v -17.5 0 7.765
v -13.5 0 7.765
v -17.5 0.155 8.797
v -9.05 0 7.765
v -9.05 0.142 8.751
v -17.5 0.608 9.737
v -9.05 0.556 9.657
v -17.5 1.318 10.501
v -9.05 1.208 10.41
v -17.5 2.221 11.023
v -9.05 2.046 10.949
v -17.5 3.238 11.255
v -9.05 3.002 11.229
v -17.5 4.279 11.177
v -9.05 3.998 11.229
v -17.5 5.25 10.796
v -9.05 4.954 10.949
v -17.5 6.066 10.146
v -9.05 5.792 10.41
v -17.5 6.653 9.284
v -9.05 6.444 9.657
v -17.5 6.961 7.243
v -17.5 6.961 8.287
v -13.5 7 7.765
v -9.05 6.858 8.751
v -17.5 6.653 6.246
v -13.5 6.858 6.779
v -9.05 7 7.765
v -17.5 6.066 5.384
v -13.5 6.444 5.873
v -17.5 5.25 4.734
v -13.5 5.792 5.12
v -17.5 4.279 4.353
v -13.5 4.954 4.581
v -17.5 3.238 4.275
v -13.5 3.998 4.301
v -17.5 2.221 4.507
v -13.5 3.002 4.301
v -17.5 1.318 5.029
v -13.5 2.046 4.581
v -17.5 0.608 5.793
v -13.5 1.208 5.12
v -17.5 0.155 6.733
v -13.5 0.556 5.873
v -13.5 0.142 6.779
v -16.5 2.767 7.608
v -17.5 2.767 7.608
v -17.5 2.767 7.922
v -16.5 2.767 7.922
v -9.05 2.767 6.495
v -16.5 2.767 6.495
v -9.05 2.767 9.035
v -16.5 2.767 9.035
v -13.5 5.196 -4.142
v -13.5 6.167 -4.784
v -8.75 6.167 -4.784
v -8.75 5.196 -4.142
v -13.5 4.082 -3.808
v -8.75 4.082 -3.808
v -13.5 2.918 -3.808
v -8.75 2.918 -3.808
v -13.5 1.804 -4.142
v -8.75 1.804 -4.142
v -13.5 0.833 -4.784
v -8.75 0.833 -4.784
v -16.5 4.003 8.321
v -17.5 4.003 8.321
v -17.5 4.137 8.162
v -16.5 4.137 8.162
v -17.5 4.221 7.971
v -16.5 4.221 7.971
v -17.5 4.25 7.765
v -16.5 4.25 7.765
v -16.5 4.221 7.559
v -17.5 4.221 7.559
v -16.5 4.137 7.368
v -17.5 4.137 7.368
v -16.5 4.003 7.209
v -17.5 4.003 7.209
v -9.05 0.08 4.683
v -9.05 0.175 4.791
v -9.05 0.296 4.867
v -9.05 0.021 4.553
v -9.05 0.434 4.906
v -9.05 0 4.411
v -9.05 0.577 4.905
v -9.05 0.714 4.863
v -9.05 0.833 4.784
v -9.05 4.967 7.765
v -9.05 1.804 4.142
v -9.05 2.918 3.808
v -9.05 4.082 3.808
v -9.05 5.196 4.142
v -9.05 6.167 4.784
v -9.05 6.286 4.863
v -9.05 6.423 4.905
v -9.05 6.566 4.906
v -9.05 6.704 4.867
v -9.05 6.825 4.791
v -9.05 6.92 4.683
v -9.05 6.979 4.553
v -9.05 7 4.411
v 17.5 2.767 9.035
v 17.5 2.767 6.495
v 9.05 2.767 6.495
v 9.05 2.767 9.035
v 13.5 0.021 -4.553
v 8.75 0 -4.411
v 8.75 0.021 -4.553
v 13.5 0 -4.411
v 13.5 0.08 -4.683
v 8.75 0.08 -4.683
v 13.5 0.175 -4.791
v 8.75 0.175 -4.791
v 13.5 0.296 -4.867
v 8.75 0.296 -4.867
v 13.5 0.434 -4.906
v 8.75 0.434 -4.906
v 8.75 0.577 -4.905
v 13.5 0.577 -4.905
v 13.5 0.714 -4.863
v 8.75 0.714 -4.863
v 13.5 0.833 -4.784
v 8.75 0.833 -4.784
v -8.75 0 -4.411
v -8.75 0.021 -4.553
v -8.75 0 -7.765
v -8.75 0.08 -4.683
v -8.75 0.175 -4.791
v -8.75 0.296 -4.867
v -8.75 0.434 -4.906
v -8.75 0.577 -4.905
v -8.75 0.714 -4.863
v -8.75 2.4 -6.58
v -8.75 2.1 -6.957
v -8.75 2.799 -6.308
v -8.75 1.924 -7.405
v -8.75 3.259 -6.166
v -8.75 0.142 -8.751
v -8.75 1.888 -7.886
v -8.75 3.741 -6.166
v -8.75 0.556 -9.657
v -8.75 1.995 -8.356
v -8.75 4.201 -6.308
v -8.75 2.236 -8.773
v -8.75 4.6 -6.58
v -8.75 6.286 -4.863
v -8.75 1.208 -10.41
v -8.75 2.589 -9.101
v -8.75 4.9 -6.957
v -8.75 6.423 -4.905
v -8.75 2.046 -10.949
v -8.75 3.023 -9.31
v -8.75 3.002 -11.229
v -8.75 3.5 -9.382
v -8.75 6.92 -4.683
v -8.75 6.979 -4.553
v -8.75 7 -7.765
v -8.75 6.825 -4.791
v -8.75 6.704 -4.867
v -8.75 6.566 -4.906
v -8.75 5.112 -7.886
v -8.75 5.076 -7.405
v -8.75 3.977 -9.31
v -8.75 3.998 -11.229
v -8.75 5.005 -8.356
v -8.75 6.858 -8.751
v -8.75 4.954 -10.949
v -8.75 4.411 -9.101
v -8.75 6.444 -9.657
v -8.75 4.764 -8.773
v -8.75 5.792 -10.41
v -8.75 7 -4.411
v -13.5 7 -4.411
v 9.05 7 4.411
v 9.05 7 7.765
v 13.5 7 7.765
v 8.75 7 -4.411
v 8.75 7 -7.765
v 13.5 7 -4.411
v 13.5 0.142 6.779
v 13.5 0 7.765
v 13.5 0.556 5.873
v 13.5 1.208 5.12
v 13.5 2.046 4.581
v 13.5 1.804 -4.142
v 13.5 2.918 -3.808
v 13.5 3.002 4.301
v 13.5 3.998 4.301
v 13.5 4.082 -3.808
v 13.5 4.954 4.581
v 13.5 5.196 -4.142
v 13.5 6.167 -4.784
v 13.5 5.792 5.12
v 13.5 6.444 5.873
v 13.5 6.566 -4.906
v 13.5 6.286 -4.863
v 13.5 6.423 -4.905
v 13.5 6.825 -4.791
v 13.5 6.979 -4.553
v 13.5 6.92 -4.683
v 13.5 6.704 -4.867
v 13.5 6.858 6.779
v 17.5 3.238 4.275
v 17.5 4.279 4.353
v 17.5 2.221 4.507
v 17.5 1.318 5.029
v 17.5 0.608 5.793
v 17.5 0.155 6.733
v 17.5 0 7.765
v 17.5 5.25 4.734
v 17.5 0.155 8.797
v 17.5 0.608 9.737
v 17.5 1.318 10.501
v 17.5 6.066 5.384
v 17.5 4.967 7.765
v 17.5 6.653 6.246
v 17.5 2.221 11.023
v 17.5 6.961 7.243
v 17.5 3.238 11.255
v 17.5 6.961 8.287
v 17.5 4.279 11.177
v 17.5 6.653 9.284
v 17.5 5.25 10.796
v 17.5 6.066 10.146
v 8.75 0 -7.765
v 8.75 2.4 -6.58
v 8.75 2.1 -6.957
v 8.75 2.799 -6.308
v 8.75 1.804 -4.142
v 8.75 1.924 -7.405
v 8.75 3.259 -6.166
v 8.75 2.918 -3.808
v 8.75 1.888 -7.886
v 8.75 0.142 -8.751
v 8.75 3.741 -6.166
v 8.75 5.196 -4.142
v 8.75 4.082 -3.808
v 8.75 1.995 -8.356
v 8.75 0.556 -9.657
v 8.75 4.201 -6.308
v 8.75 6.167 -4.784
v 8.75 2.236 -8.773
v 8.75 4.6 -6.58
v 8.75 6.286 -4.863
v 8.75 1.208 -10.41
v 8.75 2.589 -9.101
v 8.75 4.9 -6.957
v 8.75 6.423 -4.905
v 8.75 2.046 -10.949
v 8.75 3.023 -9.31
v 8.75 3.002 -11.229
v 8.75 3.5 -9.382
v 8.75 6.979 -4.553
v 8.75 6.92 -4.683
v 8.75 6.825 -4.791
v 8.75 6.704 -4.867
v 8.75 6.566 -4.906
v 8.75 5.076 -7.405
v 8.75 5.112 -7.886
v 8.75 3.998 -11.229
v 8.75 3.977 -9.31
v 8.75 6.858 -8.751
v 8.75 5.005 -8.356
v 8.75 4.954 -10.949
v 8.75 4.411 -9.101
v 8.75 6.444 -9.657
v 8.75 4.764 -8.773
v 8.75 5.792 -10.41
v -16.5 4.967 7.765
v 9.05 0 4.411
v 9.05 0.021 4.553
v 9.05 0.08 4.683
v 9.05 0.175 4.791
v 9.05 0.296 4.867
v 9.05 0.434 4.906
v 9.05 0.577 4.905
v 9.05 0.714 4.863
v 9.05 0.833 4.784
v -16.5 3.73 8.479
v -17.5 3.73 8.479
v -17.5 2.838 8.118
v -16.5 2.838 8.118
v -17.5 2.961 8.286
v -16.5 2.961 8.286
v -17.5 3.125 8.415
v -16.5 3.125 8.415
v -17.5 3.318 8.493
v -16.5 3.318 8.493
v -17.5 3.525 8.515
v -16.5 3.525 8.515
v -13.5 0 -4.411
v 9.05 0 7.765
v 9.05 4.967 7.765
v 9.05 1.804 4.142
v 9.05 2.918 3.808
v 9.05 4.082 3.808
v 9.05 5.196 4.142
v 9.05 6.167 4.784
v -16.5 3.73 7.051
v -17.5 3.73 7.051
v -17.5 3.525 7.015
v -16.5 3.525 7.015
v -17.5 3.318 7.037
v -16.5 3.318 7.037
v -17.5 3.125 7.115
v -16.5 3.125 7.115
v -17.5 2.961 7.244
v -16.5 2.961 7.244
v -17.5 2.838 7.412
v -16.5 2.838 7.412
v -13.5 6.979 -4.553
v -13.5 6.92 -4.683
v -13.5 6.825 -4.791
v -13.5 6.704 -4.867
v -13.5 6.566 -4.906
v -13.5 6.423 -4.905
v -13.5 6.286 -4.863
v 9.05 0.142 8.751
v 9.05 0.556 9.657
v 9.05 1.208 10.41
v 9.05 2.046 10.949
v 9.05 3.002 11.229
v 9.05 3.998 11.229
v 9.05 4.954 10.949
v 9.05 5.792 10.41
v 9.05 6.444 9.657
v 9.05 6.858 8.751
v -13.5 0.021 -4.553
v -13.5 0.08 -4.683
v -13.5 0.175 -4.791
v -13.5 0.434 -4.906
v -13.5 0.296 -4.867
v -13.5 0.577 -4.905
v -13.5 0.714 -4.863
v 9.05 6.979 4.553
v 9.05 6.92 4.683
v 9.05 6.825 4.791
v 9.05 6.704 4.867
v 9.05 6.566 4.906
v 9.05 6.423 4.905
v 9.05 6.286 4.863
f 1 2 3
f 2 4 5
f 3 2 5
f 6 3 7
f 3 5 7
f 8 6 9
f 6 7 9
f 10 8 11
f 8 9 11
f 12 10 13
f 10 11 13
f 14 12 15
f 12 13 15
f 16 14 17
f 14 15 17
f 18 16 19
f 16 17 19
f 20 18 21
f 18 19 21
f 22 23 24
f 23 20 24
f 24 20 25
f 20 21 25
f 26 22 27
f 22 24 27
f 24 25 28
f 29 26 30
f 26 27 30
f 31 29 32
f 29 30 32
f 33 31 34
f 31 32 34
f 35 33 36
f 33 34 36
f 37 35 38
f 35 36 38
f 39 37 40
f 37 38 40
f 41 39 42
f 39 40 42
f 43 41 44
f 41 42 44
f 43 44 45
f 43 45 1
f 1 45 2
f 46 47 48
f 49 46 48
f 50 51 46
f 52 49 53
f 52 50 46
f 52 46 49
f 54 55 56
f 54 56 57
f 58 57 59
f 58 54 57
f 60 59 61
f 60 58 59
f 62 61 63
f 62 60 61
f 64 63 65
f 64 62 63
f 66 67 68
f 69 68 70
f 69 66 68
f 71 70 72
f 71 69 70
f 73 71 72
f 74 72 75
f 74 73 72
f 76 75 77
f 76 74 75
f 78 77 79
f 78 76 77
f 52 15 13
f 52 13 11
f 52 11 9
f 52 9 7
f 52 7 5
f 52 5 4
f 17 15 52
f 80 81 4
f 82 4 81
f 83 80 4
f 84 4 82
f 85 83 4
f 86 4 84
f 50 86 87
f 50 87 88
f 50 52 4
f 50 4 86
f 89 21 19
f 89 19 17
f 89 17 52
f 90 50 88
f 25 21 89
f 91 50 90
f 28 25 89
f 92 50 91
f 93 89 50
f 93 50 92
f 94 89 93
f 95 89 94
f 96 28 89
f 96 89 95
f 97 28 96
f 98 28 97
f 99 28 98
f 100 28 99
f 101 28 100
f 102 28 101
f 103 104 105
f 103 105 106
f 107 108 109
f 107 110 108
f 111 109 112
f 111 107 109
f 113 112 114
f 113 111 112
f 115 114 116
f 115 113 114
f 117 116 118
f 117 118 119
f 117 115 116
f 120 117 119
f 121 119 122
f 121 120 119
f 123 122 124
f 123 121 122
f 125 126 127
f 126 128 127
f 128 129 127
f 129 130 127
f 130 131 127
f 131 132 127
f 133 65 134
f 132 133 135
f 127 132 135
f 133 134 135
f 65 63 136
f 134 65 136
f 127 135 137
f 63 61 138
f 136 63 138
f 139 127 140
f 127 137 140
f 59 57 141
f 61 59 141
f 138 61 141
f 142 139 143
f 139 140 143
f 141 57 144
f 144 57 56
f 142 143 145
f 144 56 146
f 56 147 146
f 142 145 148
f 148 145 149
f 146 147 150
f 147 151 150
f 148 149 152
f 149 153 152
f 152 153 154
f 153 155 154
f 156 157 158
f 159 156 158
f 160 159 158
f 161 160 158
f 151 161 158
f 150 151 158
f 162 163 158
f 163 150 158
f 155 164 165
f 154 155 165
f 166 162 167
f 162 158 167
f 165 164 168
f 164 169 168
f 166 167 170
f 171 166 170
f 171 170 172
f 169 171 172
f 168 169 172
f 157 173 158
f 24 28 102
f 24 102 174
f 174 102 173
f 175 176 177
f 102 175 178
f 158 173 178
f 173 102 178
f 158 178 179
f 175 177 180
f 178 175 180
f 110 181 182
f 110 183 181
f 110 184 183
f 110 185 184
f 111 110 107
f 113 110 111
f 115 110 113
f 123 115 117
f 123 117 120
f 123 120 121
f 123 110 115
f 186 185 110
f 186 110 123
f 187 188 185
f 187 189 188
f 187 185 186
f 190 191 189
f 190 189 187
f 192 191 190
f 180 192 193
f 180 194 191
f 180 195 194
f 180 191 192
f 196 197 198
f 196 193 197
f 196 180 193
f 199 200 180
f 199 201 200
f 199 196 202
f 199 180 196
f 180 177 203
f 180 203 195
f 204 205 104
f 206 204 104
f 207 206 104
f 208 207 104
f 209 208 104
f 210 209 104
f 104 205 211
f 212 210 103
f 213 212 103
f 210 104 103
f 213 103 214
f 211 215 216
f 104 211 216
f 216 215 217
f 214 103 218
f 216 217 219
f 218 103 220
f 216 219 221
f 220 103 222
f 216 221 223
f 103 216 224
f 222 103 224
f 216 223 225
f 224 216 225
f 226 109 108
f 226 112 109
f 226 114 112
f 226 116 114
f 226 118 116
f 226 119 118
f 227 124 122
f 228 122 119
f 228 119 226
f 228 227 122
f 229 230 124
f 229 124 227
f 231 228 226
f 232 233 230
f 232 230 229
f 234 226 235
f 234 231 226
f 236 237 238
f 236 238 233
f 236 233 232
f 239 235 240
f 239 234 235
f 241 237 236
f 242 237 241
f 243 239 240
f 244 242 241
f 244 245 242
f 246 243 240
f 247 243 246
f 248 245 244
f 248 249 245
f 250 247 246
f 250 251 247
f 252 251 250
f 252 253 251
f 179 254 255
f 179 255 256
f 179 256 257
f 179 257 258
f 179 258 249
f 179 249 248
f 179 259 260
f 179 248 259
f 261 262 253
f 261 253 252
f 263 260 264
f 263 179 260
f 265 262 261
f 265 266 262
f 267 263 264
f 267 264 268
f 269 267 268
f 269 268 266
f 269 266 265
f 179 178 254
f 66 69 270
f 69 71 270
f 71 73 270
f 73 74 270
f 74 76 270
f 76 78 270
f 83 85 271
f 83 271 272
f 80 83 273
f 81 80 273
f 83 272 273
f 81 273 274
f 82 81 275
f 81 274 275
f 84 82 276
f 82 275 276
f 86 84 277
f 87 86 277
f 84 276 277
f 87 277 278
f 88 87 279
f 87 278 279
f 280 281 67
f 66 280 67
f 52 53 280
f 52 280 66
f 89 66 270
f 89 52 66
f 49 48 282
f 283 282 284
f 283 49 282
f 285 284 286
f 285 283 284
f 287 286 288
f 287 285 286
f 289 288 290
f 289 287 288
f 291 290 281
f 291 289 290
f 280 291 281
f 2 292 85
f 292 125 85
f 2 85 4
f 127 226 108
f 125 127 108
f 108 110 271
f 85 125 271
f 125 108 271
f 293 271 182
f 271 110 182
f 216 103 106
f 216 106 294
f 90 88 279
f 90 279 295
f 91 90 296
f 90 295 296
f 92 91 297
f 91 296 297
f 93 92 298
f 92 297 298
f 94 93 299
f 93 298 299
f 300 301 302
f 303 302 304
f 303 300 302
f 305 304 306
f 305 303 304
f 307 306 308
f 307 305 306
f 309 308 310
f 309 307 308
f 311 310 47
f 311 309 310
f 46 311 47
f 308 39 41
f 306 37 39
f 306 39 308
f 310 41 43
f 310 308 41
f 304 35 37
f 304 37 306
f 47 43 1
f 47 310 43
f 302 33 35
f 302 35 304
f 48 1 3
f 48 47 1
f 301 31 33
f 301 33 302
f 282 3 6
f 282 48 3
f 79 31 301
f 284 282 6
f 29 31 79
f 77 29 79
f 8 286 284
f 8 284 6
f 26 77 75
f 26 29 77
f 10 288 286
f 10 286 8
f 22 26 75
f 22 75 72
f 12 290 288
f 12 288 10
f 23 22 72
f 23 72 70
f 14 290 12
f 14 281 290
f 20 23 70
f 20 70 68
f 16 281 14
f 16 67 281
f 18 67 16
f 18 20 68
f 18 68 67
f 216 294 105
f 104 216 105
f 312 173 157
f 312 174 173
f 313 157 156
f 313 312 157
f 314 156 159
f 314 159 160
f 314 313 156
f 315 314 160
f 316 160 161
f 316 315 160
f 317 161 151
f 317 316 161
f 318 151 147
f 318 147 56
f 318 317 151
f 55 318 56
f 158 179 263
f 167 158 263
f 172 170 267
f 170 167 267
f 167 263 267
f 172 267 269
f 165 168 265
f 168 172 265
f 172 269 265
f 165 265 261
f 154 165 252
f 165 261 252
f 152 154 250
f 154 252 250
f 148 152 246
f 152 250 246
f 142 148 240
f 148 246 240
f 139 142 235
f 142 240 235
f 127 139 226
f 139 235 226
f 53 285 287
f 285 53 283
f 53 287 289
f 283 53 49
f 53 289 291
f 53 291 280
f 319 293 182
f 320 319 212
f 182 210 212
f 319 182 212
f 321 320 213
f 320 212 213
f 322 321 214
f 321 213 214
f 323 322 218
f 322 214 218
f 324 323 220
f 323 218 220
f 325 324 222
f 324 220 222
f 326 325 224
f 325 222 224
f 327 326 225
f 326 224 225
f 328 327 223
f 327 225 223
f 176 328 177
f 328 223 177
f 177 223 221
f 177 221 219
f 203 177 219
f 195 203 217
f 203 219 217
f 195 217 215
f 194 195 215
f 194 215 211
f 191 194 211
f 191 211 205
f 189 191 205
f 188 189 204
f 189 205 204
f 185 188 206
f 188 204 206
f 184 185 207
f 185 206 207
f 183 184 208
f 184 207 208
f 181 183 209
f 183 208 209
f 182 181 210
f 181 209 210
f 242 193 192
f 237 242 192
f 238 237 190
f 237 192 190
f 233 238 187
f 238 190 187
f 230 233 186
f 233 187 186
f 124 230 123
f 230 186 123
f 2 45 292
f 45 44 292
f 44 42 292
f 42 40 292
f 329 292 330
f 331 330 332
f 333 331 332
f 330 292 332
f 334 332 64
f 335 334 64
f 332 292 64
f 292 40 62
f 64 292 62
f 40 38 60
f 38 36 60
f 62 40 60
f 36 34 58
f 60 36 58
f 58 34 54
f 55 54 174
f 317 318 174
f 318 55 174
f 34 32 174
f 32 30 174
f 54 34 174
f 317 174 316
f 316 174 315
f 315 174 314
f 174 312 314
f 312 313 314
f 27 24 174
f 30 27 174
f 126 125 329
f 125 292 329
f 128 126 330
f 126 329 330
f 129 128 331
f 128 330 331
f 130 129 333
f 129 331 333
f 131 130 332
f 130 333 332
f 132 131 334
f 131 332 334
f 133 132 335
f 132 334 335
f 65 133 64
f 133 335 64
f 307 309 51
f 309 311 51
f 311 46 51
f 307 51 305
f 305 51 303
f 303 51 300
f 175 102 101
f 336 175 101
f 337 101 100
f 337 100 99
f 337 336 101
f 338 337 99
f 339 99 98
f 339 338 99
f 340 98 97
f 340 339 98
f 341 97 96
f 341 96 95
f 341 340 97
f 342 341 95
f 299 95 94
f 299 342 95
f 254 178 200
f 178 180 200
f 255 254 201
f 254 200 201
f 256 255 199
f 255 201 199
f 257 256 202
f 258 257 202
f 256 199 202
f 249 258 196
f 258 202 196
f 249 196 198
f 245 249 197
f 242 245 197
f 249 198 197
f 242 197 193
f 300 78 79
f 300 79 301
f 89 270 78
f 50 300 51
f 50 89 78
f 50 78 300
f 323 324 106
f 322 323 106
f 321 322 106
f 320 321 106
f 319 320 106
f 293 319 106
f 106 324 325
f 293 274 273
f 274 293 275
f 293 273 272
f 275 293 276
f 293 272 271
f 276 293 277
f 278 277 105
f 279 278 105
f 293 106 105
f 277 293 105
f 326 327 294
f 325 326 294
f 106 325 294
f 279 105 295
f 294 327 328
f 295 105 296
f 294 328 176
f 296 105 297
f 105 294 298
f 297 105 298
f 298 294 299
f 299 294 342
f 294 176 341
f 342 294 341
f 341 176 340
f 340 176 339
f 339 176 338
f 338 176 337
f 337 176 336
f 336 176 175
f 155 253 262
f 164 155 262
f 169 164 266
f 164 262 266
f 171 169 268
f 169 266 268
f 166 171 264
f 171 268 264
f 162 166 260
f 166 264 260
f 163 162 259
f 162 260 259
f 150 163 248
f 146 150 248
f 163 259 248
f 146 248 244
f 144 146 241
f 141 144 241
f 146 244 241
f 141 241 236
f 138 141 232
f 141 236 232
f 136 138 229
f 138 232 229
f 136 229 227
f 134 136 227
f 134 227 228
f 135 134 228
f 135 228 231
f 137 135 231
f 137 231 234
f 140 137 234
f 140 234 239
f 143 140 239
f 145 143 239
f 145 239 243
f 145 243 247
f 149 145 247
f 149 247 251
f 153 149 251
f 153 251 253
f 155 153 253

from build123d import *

# Parameters (mm, degrees)
EXTRUDE_1_DEPTH     = 17.5
SKETCH_3_W          = 24
SKETCH_3_H          = 9
SKETCH_3_R          = 3.5
CUT_EXTRUDE_1_DEPTH = 4
SKETCH_6_R          = 4
CUT_EXTRUDE_2_DEPTH = 9.05
SKETCH_7_R          = 4
CUT_EXTRUDE_3_DEPTH = 4.75
SKETCH_8_R          = 1.616666667
CUT_EXTRUDE_4_DEPTH = 38.428601697
FILLET_1_R          = 0.5
EXTRUDE_START       = -1
SKETCH_9_R          = 3.5
SKETCH_9_R_2        = 0.75
EXTRUDE_2_DEPTH     = 1


with BuildPart() as part:
    # Эскиз1 → Бобышка-Вытянуть1 (new, symmetric)
    with BuildSketch(Plane(origin=(0, 0, 0), x_dir=(0, 0, -1), z_dir=(1, 0, 0))):
        with BuildLine():
            Line((-7.765, 7), (7.765, 7))
            ThreePointArc((7.765, 7), (11.265, 3.5), (7.765, 0))
            Line((7.765, 0), (-7.765, 0))
            ThreePointArc((-7.765, 0), (-11.265, 3.5), (-7.765, 7))
        make_face()
    extrude(amount=EXTRUDE_1_DEPTH, both=True)

    # Эскиз3 → Вырез-Вытянуть1 (cut)
    with BuildSketch(Plane(origin=(17.5, 0, 0), x_dir=(0, 0, -1), z_dir=(1, 0, 0))):
        with Locations((0, 3.5)):
            Rectangle(SKETCH_3_W, SKETCH_3_H)
        with Locations(Location((-7.765, 3.5, 0), (0, 0, 90))):
            Circle(SKETCH_3_R, mode=Mode.SUBTRACT)
    cut_extrude_1 = extrude(amount=-CUT_EXTRUDE_1_DEPTH, mode=Mode.SUBTRACT)

    # Зеркальное отражение1: Вырез-Вытянуть1 across plane
    add(cut_extrude_1.mirror(Plane(origin=(0, 0, 0), x_dir=(0, 0, 1), z_dir=(1, 0, 0))), mode=Mode.SUBTRACT)

    # Эскиз6 → Вырез-Вытянуть2 (cut, symmetric)
    with BuildSketch(Plane(origin=(0, 0, 0), x_dir=(0, 0, -1), z_dir=(1, 0, 0))):
        with Locations((-7.765, 3.5)):
            Circle(SKETCH_6_R)
    extrude(amount=CUT_EXTRUDE_2_DEPTH, both=True, mode=Mode.SUBTRACT)

    # Эскиз7 → Вырез-Вытянуть3 (cut)
    with BuildSketch(Plane(origin=(13.5, 0, 0), x_dir=(0, 0, -1), z_dir=(1, 0, 0))):
        with Locations((7.765, 3.5)):
            Circle(SKETCH_7_R)
    cut_extrude_3 = extrude(amount=-CUT_EXTRUDE_3_DEPTH, mode=Mode.SUBTRACT)

    # Зеркальное отражение2: Вырез-Вытянуть3 across plane
    add(cut_extrude_3.mirror(Plane(origin=(0, 0, 0), x_dir=(0, 0, 1), z_dir=(1, 0, 0))), mode=Mode.SUBTRACT)

    # Эскиз8 → Вырез-Вытянуть4 (cut, through all)
    with BuildSketch(Plane(origin=(17.5, 0, 0), x_dir=(0, 0, -1), z_dir=(1, 0, 0))):
        with Locations((7.765, 3.5)):
            Circle(SKETCH_8_R)
        Polygon((-9.035170592, 2.766666667), (-7.765, 4.966666667), (-6.494829408, 2.766666667), align=None)
    extrude(amount=-CUT_EXTRUDE_4_DEPTH, mode=Mode.SUBTRACT)

    # Скругление1
    fillet_1_edges = [part.edges().sort_by_distance(p)[0] for p in [
        (0, 7, 5.828508327),
        (0, 0, 5.828508327),
        (11.125, 0, -5.828508327),
        (11.125, 7, -5.828508327),
        (-11.125, 0, -5.828508327),
        (-11.125, 7, -5.828508327),
    ]]
    fillet(fillet_1_edges, radius=FILLET_1_R)

    # Эскиз9 → Бобышка-Вытянуть2 (add)
    with BuildSketch(Plane.ZY.offset(17.5).offset(EXTRUDE_START)):
        with Locations(Location((7.765, 3.5, 0), (0, 0, 90))):
            Circle(SKETCH_9_R)
        with Locations((7.765, 3.5)):
            Circle(SKETCH_9_R_2, mode=Mode.SUBTRACT)
    extrude(amount=EXTRUDE_2_DEPTH)


solid = part.part
